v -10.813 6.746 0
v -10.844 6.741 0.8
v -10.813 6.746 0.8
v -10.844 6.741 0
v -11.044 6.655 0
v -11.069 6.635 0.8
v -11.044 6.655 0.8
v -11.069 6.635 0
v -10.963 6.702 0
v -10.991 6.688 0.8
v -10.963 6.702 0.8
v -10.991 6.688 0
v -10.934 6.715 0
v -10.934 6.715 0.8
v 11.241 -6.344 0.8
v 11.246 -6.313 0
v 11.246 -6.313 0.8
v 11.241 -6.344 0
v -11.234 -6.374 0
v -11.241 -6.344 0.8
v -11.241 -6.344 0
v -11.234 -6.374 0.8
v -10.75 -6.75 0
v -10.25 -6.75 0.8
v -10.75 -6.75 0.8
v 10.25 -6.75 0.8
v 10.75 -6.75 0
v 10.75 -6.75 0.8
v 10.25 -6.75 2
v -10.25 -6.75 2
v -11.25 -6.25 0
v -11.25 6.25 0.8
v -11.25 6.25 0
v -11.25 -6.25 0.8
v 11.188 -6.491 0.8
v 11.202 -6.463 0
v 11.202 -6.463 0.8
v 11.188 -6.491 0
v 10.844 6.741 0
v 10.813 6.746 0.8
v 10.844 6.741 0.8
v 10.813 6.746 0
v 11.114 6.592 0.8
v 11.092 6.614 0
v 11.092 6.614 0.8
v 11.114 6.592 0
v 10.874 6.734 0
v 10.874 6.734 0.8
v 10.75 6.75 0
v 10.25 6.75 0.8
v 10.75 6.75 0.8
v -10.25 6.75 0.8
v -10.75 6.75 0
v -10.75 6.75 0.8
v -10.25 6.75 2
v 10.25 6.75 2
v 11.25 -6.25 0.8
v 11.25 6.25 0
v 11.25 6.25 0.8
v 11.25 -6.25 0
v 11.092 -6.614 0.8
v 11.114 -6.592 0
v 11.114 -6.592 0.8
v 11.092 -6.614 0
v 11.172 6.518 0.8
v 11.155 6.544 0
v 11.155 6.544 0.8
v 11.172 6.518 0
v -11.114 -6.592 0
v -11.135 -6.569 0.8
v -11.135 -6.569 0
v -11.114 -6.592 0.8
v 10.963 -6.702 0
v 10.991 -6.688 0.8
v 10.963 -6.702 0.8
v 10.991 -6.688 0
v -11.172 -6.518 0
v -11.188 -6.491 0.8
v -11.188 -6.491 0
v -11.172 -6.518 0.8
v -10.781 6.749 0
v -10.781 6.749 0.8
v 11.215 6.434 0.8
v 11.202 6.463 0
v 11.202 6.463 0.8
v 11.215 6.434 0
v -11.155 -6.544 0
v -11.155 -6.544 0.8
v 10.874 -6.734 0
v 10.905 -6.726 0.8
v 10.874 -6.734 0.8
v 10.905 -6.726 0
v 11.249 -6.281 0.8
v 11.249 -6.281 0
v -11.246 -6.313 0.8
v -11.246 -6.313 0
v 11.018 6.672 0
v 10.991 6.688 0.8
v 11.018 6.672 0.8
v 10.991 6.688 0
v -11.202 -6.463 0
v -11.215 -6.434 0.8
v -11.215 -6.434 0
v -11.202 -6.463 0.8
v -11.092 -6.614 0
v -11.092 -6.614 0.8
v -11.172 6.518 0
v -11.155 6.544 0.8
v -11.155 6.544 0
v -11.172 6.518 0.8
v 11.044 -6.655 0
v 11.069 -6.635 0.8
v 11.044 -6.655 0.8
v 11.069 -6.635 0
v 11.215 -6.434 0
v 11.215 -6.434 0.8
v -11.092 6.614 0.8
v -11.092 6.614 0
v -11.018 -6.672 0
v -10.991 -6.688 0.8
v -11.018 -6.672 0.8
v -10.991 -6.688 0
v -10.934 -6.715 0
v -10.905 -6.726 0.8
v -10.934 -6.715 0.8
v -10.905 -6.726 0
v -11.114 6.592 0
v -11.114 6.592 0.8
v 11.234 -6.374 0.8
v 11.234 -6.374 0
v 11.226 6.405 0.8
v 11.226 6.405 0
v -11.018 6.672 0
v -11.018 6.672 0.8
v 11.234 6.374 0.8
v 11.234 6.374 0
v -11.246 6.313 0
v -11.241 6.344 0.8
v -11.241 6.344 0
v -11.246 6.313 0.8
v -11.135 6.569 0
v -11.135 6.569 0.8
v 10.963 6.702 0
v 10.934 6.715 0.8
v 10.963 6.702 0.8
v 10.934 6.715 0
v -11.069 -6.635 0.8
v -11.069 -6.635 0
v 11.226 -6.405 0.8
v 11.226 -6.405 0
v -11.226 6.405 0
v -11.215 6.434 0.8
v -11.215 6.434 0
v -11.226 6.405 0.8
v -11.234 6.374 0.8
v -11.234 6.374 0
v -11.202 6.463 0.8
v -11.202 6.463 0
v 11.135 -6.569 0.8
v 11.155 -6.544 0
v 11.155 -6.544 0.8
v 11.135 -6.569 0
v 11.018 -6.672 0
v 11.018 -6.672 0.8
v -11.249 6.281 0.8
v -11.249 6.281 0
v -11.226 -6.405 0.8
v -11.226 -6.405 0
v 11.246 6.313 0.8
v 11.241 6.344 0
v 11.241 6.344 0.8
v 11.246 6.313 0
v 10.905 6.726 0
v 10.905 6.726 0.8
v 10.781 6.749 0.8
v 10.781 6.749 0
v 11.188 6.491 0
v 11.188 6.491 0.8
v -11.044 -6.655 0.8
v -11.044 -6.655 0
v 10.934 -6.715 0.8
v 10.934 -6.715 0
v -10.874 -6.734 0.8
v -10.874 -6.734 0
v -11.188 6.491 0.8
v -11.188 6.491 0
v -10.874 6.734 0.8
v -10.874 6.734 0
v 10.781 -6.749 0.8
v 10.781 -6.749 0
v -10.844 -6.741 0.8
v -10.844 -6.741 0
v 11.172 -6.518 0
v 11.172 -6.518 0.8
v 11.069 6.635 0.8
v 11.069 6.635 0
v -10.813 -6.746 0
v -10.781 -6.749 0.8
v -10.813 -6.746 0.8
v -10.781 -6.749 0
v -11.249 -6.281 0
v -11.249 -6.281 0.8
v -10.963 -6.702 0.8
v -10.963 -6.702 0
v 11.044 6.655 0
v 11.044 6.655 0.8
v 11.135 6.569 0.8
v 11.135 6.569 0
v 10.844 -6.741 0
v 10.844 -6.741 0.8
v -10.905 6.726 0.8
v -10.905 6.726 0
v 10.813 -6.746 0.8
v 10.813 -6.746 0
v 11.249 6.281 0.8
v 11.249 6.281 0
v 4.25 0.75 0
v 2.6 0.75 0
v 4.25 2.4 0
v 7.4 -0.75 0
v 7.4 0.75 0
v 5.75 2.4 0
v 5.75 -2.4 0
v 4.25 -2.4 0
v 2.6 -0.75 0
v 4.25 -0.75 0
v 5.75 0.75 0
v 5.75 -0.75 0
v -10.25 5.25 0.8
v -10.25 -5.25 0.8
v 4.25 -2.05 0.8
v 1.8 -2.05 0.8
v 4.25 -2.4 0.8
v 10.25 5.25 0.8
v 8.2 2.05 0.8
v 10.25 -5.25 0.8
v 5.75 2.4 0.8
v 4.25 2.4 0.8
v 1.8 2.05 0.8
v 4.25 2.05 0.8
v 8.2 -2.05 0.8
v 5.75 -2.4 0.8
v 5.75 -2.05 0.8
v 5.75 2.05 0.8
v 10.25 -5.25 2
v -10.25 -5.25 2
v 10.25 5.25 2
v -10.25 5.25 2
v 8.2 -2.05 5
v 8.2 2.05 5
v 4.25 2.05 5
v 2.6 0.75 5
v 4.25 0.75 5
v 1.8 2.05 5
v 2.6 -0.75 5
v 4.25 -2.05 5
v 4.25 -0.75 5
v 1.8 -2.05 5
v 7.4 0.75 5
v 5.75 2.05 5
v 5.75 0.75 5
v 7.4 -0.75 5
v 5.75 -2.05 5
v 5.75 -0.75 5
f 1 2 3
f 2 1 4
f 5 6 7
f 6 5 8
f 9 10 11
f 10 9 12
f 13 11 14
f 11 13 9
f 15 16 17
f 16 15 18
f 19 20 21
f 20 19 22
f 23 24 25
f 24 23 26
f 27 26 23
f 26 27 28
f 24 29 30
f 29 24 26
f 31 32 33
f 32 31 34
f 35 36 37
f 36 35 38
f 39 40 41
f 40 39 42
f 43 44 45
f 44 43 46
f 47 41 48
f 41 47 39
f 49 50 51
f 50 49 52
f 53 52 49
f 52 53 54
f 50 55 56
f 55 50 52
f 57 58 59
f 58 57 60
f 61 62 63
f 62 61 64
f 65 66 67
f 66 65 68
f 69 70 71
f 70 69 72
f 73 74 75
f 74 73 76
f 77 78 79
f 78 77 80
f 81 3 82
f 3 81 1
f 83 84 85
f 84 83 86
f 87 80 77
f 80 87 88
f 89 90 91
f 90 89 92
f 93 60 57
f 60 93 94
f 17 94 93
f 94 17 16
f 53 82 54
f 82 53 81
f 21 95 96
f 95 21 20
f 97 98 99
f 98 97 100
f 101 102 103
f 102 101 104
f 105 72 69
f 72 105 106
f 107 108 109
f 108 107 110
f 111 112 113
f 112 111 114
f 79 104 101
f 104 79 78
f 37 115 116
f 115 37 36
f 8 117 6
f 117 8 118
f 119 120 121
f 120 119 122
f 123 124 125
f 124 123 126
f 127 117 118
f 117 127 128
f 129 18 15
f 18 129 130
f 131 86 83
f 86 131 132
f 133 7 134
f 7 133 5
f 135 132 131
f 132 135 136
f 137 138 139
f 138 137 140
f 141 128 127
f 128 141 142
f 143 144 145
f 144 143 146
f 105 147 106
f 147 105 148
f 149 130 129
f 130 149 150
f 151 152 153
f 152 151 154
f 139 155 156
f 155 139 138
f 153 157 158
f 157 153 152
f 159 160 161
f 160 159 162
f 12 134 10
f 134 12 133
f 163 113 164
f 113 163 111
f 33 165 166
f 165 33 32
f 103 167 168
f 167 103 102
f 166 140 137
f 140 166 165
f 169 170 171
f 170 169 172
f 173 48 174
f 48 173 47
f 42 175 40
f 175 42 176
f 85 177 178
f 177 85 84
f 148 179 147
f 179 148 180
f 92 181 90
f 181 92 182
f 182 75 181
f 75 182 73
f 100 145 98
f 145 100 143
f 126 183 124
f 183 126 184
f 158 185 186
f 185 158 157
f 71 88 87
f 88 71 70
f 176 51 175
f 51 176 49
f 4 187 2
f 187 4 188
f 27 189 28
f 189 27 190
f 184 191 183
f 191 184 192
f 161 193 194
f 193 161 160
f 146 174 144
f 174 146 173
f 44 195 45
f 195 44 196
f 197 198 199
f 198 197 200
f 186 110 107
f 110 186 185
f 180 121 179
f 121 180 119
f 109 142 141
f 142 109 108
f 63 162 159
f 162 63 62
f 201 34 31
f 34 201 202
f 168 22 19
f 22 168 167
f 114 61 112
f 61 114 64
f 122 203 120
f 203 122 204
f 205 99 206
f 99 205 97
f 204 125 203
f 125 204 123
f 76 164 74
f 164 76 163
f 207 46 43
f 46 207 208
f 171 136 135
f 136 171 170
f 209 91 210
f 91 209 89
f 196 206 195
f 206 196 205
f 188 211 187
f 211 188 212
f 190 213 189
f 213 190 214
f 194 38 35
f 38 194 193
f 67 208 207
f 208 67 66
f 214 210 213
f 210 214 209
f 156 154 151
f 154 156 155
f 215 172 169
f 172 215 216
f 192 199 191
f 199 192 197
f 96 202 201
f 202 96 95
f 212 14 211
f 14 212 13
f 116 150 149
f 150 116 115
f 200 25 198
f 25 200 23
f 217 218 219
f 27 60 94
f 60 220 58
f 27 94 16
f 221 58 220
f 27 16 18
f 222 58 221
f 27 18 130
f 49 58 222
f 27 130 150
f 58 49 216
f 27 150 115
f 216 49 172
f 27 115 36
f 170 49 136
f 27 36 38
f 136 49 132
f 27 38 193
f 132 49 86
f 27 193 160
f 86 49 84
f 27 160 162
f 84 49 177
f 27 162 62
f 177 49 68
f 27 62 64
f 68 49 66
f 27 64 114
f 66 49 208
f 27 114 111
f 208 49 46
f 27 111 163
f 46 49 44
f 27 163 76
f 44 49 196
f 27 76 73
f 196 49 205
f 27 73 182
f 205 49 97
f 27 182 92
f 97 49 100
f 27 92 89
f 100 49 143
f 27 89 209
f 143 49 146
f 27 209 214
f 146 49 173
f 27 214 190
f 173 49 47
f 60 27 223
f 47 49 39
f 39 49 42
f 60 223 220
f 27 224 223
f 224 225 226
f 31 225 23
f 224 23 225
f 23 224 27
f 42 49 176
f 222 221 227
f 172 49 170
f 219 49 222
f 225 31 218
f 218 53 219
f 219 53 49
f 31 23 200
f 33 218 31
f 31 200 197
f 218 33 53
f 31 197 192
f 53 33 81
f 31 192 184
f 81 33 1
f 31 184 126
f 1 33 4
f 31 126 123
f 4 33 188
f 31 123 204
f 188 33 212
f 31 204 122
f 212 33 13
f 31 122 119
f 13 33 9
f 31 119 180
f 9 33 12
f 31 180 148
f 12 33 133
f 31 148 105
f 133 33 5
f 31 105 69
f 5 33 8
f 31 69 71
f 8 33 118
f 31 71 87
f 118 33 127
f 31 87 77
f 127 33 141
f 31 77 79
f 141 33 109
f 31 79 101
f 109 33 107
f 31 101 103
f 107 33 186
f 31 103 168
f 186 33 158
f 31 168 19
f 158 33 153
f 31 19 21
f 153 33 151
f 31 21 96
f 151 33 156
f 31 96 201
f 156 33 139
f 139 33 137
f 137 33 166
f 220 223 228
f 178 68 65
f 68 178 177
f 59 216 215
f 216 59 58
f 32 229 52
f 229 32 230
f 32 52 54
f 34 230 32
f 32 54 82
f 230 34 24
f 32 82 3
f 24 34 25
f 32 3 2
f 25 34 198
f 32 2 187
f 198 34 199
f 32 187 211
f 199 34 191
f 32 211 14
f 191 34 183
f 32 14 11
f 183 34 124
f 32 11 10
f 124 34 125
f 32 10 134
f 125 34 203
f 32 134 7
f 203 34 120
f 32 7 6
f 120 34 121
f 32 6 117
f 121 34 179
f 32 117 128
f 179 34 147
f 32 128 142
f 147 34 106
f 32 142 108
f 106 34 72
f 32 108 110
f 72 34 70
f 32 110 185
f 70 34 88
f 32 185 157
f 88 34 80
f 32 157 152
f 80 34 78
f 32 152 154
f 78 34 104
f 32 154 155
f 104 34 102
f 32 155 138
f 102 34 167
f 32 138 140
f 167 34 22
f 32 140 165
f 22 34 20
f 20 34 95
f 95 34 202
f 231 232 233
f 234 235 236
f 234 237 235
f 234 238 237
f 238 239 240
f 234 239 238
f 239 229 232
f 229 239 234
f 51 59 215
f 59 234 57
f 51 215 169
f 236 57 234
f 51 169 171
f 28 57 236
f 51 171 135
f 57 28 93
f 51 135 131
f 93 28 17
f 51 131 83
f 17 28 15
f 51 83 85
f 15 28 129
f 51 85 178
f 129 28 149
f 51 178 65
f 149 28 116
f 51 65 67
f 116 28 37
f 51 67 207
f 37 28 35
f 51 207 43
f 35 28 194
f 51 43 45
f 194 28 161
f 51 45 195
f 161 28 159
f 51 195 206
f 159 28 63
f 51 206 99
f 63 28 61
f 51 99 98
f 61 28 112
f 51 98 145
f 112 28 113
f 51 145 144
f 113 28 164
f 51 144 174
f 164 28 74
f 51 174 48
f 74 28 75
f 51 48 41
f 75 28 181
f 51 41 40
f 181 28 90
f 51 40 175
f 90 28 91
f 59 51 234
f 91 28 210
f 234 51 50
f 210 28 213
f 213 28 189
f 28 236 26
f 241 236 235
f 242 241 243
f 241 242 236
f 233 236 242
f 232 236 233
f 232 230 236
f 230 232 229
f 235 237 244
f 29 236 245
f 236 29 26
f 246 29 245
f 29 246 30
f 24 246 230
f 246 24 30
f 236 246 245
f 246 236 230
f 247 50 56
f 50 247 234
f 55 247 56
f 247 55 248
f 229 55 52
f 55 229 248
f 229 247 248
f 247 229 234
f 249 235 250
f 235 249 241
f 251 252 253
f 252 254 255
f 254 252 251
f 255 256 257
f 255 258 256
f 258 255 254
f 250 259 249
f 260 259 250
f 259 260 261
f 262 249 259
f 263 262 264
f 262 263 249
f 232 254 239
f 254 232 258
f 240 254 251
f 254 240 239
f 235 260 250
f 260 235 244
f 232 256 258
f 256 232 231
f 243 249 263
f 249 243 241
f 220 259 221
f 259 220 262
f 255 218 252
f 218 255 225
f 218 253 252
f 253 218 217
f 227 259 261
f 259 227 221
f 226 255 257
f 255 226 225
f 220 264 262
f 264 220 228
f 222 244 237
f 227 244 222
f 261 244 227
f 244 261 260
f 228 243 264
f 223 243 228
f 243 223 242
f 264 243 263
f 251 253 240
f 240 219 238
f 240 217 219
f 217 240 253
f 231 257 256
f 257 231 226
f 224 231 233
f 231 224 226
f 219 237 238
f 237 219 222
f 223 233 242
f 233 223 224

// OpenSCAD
base_x = 22.5;
base_y = 13.5;
base_h = 0.8;

base_hole_r = 5.5 / 2;

stem_shift = 5;

stem_cutout_x = 4.1;
stem_cutout_y = 1.5;
stem_cutout_x_margin = 0.7;

stem_h = 5;

rounding_r = 0.5;

epsilon = 0.01;


module base()
{
    translate([-base_x / 2, -base_y / 2, 0])
    {
        intersection()
        {
            translate([rounding_r, rounding_r, 0]) minkowski()
            {
                cube([base_x - 2 * rounding_r, base_y - 2 * rounding_r, base_h]);
                cylinder(base_h, rounding_r, rounding_r);
            }
            
            cube([base_x, base_y, base_h]); 
        }
    }
}

module reinforcements()
{
    translate([-base_x / 2 + 1, -base_y / 2, 0])
    {
        cube([base_x - 2, 1.5, 2]);
    }
    
        translate([-base_x / 2 + 1, base_y / 2 - 1.5, 0])
    {
        cube([base_x - 2, 1.5, 2]);
    }
}

module stem_cutout()
{
    translate([stem_shift, 0, 0]) union()
    {
        translate([-stem_cutout_x / 2 -stem_cutout_x_margin / 2, - stem_cutout_y / 2, - epsilon])
        {
            cube([stem_cutout_x + stem_cutout_x_margin, stem_cutout_y, stem_h + epsilon * 2]);        
        }

        translate([-stem_cutout_y / 2, -stem_cutout_x / 2 -stem_cutout_x_margin / 2, - epsilon])
        {
            cube([stem_cutout_y, stem_cutout_x + stem_cutout_x_margin, stem_h + epsilon * 2]);        
        }    
    }  
}

module stem()
{
    translate([stem_shift - (stem_cutout_x + stem_cutout_x_margin) / 2 - 0.8, - stem_cutout_x / 2, 0])
    {
        cube([stem_cutout_x + stem_cutout_x_margin + 1.6, stem_cutout_x, stem_h]);  
    }
}

module adapter()
{
    $fn = 100;
 
    difference()
    {
        union()
        {
            base();
            reinforcements();
            stem();
        }    
        stem_cutout(); 
    }
}

adapter();
